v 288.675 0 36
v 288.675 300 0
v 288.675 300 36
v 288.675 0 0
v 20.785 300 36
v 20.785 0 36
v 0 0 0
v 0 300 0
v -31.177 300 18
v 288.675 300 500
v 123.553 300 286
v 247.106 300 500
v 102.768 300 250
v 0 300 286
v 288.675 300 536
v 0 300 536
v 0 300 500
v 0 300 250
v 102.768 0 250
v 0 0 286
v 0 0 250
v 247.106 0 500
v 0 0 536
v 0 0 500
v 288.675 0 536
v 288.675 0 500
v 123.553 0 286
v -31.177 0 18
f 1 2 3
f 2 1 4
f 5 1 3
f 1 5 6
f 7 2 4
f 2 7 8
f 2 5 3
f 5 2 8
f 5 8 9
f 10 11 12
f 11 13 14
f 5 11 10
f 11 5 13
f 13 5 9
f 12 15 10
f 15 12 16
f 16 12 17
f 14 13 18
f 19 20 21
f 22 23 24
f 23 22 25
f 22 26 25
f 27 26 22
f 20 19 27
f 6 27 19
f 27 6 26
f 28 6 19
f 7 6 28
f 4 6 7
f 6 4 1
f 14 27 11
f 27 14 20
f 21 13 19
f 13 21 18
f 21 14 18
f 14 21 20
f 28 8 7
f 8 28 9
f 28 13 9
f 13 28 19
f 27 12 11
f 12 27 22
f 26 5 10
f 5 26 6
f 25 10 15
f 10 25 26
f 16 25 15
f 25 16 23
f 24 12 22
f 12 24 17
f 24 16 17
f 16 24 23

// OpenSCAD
//material stats : t=36,w=385,l=1430

mat_w = 300;
mat_t = 36; //material thickness

//mid_section_l = 700;
h = 500;

a= 60;
//h = sin(a)*mid_section_l;
mid_section_l = h/sin(a);
bottom_l = cos(a)*mid_section_l;

echo("bottom/tom l =", bottom_l);
echo("heigth =", h);
echo("mid_section_l =", mid_section_l);
echo("total_l =", bottom_l + bottom_l + mid_section_l);
//echo("heigth =", h);

//bottom
cube(size = [bottom_l, mat_w, mat_t], center = false);

//midshelf
translate([0,0,(3*h)/6]){
    cube(size = [bottom_l/2, mat_w, mat_t], center = false);
}

rotate([0,-a,0]) {
    cube(size = [mid_section_l, mat_w, mat_t], center = false);
}

//top
translate([0,0,h]){
    cube(size = [bottom_l, mat_w, mat_t], center = false);
}
